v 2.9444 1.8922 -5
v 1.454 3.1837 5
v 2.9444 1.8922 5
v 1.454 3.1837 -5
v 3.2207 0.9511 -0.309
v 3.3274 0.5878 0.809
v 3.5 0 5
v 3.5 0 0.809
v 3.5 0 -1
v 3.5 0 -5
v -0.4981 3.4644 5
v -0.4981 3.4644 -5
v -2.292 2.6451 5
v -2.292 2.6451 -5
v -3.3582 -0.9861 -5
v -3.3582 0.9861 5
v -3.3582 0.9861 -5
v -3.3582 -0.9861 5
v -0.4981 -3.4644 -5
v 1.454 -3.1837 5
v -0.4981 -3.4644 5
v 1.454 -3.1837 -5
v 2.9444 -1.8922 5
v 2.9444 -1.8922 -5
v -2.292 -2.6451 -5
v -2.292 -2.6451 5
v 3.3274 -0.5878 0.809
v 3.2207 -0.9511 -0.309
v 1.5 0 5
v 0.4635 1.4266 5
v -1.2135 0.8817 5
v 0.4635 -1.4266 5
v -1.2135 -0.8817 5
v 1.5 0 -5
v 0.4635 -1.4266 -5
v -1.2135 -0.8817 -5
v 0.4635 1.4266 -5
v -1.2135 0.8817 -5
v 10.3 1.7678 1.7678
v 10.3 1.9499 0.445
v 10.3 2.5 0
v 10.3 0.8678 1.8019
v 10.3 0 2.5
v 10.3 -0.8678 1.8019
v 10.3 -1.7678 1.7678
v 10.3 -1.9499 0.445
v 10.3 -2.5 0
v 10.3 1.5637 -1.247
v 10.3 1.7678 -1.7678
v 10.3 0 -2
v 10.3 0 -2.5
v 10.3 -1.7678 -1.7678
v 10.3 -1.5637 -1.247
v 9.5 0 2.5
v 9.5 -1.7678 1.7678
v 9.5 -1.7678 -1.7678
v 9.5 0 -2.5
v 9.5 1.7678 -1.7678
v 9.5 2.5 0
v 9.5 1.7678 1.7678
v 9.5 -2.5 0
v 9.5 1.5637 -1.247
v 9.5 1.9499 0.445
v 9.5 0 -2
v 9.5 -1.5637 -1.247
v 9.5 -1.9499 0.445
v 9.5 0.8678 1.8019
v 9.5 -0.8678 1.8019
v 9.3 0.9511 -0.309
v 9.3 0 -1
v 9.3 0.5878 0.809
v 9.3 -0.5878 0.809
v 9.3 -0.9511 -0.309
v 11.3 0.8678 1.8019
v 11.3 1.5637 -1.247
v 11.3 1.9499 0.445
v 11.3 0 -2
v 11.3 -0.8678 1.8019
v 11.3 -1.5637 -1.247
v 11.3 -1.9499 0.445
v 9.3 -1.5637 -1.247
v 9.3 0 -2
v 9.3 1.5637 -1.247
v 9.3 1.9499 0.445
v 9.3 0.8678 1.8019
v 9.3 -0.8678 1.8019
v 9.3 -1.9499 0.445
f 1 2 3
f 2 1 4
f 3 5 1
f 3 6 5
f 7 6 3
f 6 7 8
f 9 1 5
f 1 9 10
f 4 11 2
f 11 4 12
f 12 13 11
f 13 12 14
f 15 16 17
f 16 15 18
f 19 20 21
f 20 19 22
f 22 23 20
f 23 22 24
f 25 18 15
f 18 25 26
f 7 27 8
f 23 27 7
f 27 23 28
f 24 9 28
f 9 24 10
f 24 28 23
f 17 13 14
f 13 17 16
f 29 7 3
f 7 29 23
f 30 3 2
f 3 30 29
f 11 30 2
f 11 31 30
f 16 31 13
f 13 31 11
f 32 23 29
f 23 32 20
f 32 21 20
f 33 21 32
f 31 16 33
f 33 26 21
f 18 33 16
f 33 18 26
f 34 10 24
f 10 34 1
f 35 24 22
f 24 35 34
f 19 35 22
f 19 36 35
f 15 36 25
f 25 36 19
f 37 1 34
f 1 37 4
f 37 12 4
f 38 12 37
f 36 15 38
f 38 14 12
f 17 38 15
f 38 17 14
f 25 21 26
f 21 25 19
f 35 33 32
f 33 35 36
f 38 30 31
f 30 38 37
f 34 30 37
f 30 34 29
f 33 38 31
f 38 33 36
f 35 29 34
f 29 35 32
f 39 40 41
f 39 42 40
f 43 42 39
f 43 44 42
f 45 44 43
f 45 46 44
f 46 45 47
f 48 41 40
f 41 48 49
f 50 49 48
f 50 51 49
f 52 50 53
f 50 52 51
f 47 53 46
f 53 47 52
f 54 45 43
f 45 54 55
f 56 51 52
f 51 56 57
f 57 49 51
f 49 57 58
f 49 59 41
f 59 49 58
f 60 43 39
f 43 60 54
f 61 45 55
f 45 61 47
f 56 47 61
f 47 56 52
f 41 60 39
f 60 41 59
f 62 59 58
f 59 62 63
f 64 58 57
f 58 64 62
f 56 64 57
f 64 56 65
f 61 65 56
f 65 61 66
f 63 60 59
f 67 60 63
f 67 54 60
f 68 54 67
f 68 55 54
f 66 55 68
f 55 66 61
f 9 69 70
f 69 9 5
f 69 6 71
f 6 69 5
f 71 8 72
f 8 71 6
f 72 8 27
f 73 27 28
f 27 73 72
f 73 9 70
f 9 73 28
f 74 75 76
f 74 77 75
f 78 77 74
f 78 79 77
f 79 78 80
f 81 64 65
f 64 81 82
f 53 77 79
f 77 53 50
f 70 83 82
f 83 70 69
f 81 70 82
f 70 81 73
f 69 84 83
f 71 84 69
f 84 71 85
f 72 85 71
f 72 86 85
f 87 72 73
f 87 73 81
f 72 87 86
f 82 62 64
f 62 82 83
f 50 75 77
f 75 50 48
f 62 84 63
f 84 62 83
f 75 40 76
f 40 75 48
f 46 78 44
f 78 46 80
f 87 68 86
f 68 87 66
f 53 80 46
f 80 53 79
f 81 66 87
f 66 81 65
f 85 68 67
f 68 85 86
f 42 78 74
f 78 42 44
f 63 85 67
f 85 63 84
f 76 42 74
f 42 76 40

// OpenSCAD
// Parameters
bore_diameter_mm = 3.0; //[1.5:6.0:0.1]
outer_diameter_mm = 7.0; //[3.5:14.0:0.1]
length_mm = 10.0; //[5.0:20.0:0.1]
bore_radius_mm = bore_diameter_mm/2; //[0.75:3.0:0.05]
outer_radius_mm = outer_diameter_mm/2; //[1.75:7.0:0.05]
casing_thickness_mm = 0.7; //[0.35:1.4:0.05]
eps_overlap_mm = 1.0; //[0.5:2.0:0.1]
screw_shank_radius_mm = 1.0; //[0.6:2.0:0.05]
screw_length_mm = 8.0; //[4.0:16.0:0.5]
screw_head_radius_mm = 2.0; //[1.0:4.0:0.1]
screw_head_height_mm = 2.0; //[1.0:4.0:0.1]
washer_outer_radius_mm = 2.5; //[1.5:5.0:0.1]
washer_thickness_mm = 0.8; //[0.4:1.6:0.05]

// Linear Bearing (added/fixed): outer shell with through-bore
// NOTE: The original code accidentally subtracted almost the entire body,
// leaving no bearing. This creates a proper connected bearing shell.
module linear_bearing() {
  color("DimGray")
  difference() {
    // Outer body
    cylinder(r=outer_radius_mm, h=length_mm, center=true);

    // Inner bore (extend a bit to ensure clean cut)
    cylinder(r=bore_radius_mm, h=length_mm + 2*eps_overlap_mm, center=true);
  }
}

// Screw and Washer - positioned to intersect bearing by eps_overlap_mm
module screw_and_washer() {
  // Place screw along +X, starting slightly inside bearing OD for guaranteed connection
  // Bearing outer surface at x = outer_radius_mm
  // Shank spans [x0 - L/2, x0 + L/2] where x0 is its center.
  // Set left end = outer_radius_mm - eps_overlap_mm  => x0 = outer_radius_mm - eps_overlap_mm + L/2
  shank_center_x = outer_radius_mm - eps_overlap_mm + screw_length_mm/2;

  // Washer sits between shank and head with slight overlap
  washer_center_x = shank_center_x + screw_length_mm/2 + washer_thickness_mm/2 - eps_overlap_mm;

  // Head sits after washer with slight overlap
  head_center_x  = shank_center_x + screw_length_mm/2 + washer_thickness_mm + screw_head_height_mm/2 - 2*eps_overlap_mm;

  color("Silver")
  union() {
    // Screw shank
    translate([shank_center_x, 0, 0])
      rotate([0, 90, 0])
      cylinder(r=screw_shank_radius_mm, h=screw_length_mm, center=true);

    // Washer (ring)
    difference() {
      translate([washer_center_x, 0, 0])
        rotate([0, 90, 0])
        cylinder(r=washer_outer_radius_mm, h=washer_thickness_mm, center=true);

      translate([washer_center_x, 0, 0])
        rotate([0, 90, 0])
        cylinder(r=screw_shank_radius_mm + eps_overlap_mm/4,
                 h=washer_thickness_mm + 2*eps_overlap_mm, center=true);
    }

    // Screw head
    translate([head_center_x, 0, 0])
      rotate([0, 90, 0])
      cylinder(r=screw_head_radius_mm, h=screw_head_height_mm, center=true);
  }
}

// Assembly - ensure everything is one connected solid
module assembly() {
  union() {
    linear_bearing();      // bearing is now present and solid
    screw_and_washer();    // overlaps bearing by eps_overlap_mm
  }
}

assembly();
